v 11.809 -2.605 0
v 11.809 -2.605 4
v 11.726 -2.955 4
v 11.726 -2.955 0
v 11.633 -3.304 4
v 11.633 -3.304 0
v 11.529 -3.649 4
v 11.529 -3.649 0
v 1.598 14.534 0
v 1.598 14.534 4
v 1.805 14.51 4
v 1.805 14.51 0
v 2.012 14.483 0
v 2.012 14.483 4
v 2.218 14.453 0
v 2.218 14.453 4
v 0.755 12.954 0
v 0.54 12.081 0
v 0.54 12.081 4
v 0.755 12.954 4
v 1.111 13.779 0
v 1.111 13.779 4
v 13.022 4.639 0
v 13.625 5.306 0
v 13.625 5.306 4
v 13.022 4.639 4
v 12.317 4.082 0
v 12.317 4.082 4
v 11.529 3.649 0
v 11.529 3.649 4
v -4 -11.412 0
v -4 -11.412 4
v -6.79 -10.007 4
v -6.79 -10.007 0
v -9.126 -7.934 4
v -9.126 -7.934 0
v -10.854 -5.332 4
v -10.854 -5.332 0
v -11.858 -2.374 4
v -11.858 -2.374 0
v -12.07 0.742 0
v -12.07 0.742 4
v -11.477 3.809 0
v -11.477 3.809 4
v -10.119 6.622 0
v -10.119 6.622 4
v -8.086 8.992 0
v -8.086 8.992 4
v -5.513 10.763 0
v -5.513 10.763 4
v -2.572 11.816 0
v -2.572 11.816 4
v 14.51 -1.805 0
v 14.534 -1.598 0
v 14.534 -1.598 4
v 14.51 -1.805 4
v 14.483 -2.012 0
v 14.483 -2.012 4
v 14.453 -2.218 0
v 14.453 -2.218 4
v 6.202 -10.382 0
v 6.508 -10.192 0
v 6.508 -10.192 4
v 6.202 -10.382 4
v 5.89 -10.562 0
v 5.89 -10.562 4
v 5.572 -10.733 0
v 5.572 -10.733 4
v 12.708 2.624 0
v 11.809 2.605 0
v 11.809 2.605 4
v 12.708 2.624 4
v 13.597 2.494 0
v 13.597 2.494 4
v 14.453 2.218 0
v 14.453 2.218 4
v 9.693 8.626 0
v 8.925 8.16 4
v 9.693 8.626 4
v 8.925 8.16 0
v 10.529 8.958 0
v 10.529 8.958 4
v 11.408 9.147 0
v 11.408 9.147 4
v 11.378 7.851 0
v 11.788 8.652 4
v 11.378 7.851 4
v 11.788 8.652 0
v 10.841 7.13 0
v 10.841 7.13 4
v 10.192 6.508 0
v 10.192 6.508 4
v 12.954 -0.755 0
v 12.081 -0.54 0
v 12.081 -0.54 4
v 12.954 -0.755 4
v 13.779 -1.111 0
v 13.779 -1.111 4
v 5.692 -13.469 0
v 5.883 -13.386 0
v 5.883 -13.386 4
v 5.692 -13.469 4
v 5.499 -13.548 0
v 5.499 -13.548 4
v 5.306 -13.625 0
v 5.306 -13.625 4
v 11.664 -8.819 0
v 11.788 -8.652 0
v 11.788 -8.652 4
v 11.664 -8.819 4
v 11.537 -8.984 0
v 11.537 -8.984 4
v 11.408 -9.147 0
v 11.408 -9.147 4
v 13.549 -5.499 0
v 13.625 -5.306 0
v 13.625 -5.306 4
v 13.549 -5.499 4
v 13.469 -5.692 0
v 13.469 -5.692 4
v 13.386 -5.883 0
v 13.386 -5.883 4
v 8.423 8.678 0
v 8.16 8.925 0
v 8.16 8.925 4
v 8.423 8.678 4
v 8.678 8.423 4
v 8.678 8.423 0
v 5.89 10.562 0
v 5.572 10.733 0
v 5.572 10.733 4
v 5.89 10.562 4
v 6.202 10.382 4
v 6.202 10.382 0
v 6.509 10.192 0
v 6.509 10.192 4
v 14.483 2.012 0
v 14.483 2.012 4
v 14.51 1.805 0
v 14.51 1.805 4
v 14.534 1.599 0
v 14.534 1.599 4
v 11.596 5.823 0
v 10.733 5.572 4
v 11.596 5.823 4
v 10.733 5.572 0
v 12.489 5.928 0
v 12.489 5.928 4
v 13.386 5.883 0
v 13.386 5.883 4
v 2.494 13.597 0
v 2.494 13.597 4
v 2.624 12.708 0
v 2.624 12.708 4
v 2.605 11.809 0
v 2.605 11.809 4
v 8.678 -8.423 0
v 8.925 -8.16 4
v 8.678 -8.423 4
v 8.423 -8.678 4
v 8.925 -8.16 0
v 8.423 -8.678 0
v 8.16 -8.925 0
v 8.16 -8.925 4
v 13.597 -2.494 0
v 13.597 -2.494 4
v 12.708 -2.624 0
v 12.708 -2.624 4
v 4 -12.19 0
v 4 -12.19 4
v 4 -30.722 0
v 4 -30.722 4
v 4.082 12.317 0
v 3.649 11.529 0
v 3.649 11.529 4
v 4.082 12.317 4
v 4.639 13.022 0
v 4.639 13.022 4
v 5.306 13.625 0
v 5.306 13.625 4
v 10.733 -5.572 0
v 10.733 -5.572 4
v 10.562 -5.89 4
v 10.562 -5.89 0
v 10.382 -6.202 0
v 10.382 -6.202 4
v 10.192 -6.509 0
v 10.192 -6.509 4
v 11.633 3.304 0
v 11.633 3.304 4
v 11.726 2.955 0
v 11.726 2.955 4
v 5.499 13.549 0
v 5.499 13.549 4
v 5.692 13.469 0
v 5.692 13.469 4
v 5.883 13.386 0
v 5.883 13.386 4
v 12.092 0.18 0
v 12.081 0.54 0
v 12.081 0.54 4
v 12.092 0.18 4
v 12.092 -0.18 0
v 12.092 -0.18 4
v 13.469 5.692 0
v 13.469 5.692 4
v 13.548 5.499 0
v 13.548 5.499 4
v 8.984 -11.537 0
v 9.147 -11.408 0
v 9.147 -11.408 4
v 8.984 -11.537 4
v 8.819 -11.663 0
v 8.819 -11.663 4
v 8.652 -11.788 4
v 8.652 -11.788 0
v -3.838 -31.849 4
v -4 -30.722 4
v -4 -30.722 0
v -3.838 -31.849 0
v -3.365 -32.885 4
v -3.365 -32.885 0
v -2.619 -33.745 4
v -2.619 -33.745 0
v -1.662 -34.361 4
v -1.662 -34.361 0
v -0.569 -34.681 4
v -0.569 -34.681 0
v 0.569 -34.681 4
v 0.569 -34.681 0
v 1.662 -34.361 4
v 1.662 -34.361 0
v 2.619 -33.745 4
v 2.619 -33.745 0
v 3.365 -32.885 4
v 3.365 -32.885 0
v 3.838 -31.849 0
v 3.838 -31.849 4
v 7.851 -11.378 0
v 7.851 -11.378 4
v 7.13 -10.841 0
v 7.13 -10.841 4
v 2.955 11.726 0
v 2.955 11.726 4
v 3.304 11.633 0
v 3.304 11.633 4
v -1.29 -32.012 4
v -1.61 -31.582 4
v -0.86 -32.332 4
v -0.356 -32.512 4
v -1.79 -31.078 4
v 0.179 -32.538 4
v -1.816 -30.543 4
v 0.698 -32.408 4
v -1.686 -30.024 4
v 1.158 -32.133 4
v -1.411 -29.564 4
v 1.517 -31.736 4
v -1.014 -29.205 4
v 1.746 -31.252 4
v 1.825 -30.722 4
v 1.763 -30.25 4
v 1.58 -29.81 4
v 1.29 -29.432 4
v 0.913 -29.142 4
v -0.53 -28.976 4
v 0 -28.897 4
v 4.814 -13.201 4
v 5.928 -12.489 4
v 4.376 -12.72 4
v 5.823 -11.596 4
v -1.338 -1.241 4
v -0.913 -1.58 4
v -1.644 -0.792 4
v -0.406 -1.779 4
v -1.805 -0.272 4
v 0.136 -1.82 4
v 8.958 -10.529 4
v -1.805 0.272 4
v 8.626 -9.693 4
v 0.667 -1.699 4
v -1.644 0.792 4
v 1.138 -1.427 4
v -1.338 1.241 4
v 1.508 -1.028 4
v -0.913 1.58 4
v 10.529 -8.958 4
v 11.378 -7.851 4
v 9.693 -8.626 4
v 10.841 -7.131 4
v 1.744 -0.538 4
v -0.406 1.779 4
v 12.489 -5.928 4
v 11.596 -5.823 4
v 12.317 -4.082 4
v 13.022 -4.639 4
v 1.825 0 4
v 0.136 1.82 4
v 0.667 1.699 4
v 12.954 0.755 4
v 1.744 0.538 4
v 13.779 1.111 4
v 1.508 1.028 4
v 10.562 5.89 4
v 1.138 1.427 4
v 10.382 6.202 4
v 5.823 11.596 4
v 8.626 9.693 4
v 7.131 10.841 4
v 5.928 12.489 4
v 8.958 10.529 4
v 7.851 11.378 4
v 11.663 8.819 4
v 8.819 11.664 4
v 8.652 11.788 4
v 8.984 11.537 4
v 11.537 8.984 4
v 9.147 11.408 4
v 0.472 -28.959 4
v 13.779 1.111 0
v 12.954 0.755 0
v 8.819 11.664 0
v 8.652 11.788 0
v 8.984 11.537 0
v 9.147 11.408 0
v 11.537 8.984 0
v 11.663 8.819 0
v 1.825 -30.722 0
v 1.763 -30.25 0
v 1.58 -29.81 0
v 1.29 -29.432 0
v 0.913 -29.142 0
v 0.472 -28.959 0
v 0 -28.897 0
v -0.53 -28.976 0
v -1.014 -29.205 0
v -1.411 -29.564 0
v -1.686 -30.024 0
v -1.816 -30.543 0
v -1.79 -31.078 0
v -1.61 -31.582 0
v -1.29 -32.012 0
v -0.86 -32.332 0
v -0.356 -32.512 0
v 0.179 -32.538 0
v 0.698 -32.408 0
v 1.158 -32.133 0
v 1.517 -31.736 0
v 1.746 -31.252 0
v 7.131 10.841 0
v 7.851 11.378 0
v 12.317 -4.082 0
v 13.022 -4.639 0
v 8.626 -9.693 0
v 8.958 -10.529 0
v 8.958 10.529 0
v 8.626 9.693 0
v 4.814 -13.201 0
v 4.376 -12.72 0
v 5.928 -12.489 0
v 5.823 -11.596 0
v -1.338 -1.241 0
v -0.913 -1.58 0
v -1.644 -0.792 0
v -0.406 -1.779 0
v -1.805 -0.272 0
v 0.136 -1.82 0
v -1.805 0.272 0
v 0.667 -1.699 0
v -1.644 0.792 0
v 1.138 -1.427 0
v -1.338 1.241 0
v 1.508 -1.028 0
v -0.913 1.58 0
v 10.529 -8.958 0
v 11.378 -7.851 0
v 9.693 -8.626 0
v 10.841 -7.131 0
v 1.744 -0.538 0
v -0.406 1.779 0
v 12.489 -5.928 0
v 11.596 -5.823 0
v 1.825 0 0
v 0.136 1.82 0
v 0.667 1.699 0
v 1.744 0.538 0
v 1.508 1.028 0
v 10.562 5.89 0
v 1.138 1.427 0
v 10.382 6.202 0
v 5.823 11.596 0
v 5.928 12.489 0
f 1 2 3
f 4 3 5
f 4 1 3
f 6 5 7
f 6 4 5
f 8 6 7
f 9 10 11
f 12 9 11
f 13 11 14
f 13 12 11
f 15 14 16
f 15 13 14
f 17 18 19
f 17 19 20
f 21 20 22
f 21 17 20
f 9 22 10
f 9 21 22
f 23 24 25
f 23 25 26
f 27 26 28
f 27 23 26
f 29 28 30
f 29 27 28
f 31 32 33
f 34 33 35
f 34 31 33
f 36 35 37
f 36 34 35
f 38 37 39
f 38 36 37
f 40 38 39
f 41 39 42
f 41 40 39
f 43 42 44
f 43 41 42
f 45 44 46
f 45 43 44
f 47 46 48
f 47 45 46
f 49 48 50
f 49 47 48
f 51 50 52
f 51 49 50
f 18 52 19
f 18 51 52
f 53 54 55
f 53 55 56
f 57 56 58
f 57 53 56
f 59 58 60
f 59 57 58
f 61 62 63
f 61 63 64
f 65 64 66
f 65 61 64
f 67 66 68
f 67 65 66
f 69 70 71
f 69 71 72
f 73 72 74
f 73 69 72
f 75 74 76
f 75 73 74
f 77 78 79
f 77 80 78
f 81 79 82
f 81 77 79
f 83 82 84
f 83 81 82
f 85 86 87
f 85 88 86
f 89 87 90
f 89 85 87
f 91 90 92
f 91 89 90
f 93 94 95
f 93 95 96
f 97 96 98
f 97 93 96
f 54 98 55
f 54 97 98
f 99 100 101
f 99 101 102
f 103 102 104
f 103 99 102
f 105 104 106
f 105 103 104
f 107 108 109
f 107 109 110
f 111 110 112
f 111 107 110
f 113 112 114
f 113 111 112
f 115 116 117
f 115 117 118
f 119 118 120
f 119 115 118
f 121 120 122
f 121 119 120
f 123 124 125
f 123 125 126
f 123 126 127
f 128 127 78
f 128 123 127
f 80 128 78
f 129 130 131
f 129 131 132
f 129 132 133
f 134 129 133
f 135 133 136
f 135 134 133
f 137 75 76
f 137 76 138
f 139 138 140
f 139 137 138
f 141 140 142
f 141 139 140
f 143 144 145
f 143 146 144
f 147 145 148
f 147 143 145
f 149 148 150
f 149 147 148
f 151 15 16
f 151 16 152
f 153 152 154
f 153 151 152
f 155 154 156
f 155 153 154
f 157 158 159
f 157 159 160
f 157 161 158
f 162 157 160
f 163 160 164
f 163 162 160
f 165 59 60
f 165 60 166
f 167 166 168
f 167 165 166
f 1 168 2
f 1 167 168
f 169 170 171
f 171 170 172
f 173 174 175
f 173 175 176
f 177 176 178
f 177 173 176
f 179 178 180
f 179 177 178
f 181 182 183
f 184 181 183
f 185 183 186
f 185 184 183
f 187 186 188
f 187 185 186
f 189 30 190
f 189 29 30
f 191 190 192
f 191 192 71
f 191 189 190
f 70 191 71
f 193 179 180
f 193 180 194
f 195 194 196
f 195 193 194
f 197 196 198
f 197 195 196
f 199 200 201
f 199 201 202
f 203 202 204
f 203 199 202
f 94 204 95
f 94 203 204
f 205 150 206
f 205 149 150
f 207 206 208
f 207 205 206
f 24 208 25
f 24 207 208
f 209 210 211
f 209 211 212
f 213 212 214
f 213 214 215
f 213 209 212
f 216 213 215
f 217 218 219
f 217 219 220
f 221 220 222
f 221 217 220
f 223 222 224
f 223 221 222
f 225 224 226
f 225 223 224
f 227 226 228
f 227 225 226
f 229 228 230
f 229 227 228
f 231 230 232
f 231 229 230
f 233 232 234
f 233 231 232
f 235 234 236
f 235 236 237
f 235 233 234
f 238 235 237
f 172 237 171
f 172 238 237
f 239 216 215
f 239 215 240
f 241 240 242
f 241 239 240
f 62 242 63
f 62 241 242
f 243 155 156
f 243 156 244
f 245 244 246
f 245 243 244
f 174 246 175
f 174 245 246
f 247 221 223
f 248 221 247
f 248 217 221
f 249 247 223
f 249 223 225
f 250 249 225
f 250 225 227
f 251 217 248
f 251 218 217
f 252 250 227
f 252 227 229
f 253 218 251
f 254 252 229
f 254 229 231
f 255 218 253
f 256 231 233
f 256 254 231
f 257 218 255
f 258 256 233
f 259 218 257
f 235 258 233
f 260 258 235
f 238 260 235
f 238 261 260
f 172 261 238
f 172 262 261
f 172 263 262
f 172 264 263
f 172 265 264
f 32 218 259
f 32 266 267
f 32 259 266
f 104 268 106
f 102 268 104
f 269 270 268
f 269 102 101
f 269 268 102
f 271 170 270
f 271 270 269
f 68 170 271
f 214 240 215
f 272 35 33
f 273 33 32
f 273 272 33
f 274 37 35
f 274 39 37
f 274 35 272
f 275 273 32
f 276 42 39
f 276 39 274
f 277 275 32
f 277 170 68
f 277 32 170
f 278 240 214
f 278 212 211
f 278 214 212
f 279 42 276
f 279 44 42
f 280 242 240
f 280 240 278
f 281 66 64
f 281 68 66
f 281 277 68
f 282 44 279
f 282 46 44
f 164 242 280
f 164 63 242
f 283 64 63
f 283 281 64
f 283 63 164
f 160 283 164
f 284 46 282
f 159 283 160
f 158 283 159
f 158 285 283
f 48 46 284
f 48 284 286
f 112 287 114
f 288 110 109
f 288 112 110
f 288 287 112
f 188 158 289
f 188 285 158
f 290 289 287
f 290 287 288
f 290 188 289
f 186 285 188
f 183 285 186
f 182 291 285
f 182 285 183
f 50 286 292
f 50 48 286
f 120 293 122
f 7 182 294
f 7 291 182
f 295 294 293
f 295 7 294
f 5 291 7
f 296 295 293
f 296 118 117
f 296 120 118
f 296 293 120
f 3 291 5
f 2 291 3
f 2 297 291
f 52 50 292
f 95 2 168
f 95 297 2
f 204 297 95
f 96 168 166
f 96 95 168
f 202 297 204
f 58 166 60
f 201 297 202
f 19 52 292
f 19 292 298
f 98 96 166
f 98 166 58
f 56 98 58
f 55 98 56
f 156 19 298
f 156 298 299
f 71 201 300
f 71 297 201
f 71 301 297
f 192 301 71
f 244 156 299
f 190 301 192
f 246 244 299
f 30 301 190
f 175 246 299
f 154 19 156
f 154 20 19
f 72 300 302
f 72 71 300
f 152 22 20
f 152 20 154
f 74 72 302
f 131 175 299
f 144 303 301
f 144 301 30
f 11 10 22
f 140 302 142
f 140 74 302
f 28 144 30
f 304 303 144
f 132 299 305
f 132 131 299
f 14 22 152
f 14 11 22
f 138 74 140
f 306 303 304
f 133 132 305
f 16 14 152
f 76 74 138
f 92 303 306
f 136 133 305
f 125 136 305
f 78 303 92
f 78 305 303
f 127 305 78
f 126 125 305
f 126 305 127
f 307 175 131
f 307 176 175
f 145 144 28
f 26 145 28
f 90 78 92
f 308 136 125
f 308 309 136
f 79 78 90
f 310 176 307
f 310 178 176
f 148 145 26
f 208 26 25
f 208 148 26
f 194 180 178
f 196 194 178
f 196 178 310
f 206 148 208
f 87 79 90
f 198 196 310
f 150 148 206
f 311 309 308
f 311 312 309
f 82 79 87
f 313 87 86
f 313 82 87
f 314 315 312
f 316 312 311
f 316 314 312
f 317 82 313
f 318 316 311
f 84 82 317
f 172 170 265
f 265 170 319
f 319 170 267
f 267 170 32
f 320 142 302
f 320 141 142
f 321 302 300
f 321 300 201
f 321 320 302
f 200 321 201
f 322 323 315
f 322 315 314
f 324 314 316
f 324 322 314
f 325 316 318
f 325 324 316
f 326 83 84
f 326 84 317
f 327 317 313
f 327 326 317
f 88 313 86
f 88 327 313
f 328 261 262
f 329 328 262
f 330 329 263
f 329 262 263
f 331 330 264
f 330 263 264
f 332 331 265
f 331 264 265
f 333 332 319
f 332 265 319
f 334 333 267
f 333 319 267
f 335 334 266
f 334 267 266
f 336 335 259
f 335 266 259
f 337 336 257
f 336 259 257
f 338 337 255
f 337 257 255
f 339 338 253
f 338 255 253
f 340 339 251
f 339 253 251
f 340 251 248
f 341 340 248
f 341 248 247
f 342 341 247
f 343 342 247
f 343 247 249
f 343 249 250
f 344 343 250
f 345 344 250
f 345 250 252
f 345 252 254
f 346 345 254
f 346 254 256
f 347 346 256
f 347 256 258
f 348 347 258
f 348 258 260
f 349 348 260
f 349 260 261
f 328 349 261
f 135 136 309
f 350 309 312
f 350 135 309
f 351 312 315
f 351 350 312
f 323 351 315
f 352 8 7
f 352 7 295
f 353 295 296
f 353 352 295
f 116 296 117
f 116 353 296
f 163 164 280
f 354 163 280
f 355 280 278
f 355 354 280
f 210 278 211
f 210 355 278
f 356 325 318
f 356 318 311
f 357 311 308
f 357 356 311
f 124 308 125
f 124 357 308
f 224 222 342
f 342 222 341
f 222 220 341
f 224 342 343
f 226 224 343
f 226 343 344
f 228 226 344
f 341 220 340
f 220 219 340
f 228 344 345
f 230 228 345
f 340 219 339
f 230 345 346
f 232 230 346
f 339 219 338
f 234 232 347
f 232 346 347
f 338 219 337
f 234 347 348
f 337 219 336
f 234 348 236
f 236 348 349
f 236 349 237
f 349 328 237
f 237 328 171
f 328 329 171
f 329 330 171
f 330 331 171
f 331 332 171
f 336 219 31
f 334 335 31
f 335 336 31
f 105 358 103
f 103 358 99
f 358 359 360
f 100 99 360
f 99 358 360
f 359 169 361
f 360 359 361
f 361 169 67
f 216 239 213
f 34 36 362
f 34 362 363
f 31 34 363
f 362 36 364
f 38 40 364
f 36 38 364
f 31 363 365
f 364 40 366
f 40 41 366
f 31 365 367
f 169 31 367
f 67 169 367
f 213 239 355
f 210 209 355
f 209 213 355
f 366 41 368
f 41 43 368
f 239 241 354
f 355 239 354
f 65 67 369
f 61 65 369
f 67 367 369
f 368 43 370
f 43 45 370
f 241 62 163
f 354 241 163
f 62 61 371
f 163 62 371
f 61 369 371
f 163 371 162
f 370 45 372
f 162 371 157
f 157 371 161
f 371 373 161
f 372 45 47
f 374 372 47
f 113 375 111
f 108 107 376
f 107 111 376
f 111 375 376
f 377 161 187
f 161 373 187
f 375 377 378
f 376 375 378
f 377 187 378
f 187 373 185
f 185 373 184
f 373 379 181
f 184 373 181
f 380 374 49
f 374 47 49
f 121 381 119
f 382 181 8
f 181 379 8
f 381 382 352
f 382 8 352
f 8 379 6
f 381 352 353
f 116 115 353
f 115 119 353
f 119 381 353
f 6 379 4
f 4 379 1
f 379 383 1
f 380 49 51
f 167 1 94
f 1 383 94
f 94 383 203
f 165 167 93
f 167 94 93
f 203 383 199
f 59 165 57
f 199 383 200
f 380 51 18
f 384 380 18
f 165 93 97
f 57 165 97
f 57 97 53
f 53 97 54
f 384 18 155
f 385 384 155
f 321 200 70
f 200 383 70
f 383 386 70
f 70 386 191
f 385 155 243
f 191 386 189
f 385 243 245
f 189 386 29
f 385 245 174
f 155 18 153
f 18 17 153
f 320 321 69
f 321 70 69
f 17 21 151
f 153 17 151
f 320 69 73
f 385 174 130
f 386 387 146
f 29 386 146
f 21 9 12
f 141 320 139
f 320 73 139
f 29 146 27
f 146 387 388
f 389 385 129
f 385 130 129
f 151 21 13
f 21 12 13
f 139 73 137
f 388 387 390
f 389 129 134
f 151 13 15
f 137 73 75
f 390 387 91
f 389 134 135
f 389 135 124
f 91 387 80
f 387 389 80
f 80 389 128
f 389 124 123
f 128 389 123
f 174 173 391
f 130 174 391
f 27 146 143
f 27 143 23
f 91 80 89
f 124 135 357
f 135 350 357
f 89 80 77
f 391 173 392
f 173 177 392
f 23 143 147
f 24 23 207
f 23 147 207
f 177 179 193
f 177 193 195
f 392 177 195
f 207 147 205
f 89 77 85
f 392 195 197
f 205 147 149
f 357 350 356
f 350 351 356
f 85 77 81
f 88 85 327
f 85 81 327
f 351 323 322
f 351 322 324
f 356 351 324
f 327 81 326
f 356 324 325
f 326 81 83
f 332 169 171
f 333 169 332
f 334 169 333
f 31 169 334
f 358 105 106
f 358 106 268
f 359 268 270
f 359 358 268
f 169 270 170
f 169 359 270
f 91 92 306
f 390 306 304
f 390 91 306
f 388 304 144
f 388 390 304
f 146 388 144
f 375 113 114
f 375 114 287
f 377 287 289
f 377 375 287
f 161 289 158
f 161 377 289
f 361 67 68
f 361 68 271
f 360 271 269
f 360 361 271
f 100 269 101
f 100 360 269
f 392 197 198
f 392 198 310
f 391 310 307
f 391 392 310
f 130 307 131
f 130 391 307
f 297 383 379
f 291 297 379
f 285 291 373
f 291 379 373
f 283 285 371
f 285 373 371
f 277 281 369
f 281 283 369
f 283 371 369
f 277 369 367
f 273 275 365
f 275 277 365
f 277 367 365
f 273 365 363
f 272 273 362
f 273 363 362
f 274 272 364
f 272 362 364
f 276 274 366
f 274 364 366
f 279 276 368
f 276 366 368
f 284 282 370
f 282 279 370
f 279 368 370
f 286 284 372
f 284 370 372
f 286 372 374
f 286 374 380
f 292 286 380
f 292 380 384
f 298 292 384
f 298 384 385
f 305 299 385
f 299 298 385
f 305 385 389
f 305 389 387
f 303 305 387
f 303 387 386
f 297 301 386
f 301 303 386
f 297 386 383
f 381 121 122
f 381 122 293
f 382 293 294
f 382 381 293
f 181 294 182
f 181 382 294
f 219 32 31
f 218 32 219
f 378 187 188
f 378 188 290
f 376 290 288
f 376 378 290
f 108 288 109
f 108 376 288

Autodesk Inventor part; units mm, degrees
ref_plane "YZ Plane" through (0, 0, 0) normal (1, 0, 0) x (0, 1, 0)
ref_plane "XZ Plane" through (0, 0, 0) normal (0, 1, 0) x (-1, 0, 0)
ref_plane "XY Plane" through (0, 0, 0) normal (0, 0, 1) x (1, 0, 0)
sketch "Náčrt1" plane through (0, 0, 0) normal (0, 0, 1) x (1, 0, 0)
  circle A0 centre (0, 0) radius 12.093
  circle A1 centre (0, 0) radius 1.825
  dimension "d0" = 24.186
  dimension "d1" = 3.65
extrude "Vysunutí1" add sketch "Náčrt1" along normal blind 4
sketch "Náčrt2" plane through (0, 0, 0) normal (0, 0, -1) x (-1, 0, 0)
  line L0 (0, 0) -> (0, 17.286)
  circle A0 centre (0, 0) radius 1.825 projected
  line L1 (0, 0) -> (3.0566, 13.6745)
  line L2 (0, 0) -> (-0.9214, -21.9835)
  arc A1 (-0.5405, 12.0809) -> (-1.5985, 14.5344) centre (-5.8739, 11.2357) ccw
  arc A2 (-8.6515, 11.7879) -> (-9.147, 11.4077) centre (0, 0) ccw
  arc A3 (-11.4077, 9.147) -> (-11.7879, 8.6515) centre (0, 0) ccw
  arc A4 (-5.3058, 13.6254) -> (-5.8828, 13.3864) centre (0, 0) ccw
  arc A5 (-13.3864, 5.8828) -> (-13.6254, 5.3058) centre (0, 0) ccw
  arc A6 (-14.4528, 2.2177) -> (-14.5344, 1.5985) centre (0, 0) ccw
  arc A7 (-14.5344, -1.5985) -> (-14.4528, -2.2177) centre (0, 0) ccw
  arc A8 (-13.6254, -5.3058) -> (-13.3864, -5.8828) centre (0, 0) ccw
  arc A9 (-11.7879, -8.6515) -> (-11.4077, -9.147) centre (0, 0) ccw
  arc A10 (-9.147, -11.4077) -> (-8.6515, -11.7879) centre (0, 0) ccw
  arc A11 (-5.8828, -13.3864) -> (-5.3058, -13.6254) centre (0, 0) ccw
  arc A12 (-1.5985, 14.5344) -> (-2.2177, 14.4528) centre (0, 0) ccw
  circle A13 centre (0, 0) radius 12.093 projected
  arc A14 (-2.2177, 14.4528) -> (-2.6047, 11.8091) centre (2.7657, 12.3732) ccw
  arc A15 (-5.8828, 13.3864) -> (-5.5724, 10.7326) centre (-0.5309, 12.6674) ccw
  arc A16 (-9.147, 11.4077) -> (-8.1603, 8.9247) centre (-3.7914, 12.0983) ccw
  arc A17 (-11.7879, 8.6515) -> (-10.1922, 6.5085) centre (-6.7935, 10.7048) ccw
  arc A18 (-13.6254, 5.3058) -> (-11.5294, 3.6488) centre (-9.3326, 8.5818) ccw
  arc A19 (-14.5344, 1.5985) -> (-12.0809, 0.5405) centre (-11.2357, 5.8739) ccw
  arc A20 (-14.4528, -2.2177) -> (-11.8091, -2.6047) centre (-12.3732, 2.7657) ccw
  arc A21 (-13.3864, -5.8828) -> (-10.7326, -5.5724) centre (-12.6674, -0.5309) ccw
  arc A22 (-11.4077, -9.147) -> (-8.9247, -8.1603) centre (-12.0983, -3.7914) ccw
  arc A23 (-8.6515, -11.7879) -> (-6.5085, -10.1922) centre (-10.7048, -6.7935) ccw
  arc A24 (-5.3058, -13.6254) -> (-3.6488, -11.5294) centre (-8.5818, -9.3326) ccw
  arc A25 (-3.6488, 11.5294) -> (-5.3058, 13.6254) centre (-8.5818, 9.3326) ccw
  arc A26 (-6.5085, 10.1922) -> (-8.6515, 11.7879) centre (-10.7048, 6.7935) ccw
  arc A27 (-8.9247, 8.1603) -> (-11.4077, 9.147) centre (-12.0983, 3.7914) ccw
  arc A28 (-10.7326, 5.5724) -> (-13.3864, 5.8828) centre (-12.6674, 0.5309) ccw
  arc A29 (-11.8091, 2.6047) -> (-14.4528, 2.2177) centre (-12.3732, -2.7657) ccw
  arc A30 (-12.0809, -0.5405) -> (-14.5344, -1.5985) centre (-11.2357, -5.8739) ccw
  arc A31 (-11.5294, -3.6488) -> (-13.6254, -5.3058) centre (-9.3326, -8.5818) ccw
  arc A32 (-10.1922, -6.5085) -> (-11.7879, -8.6515) centre (-6.7935, -10.7048) ccw
  arc A33 (-8.1603, -8.9247) -> (-9.147, -11.4077) centre (-3.7914, -12.0983) ccw
  arc A34 (-5.5724, -10.7326) -> (-5.8828, -13.3864) centre (-0.5309, -12.6674) ccw
  dimension "d6" = 12.6
  dimension "d17" = 169.8
  dimension "d22" = 10.8
  dimension "d29" = 150
  dimension "d33" = 150
extrude "Vysunutí2" add sketch "Náčrt2" against normal blind 4 contours A13 A14 A12 A1
pattern_circular "Kruhové pole1" count 11 over 150 about axis through (0, 0, 0) along (0, 0, -1) of "Vysunutí2"
sketch "Náčrt3" plane through (0, 0, 4) normal (0, 0, 1) x (1, 0, 0)
  line L0 (0, 0) -> (0, -30.722)
  circle A0 centre (0, -30.722) radius 1.825
  line L1 (-4, 1.3777) -> (-4, -30.722)
  line L2 (4, 1.3777) -> (4, -30.722)
  arc A1 (-4, -30.722) -> (4, -30.722) centre (0, -30.722) ccw
  line L3 (-4, -8.9953) -> (4, -8.9953)
  point P0 (-4, -33.1583)
  point P1 (4, -33.1583)
  dimension "d40" = 30.722
  dimension "d41" = 3.65
  dimension "d42" = 34.536
  dimension "d43" = 4
  dimension "d44" = 8
extrude "Vysunutí3" add sketch "Náčrt3" against normal blind 4
properties part number "zubate_kolo1" material "ABS Plastic"
